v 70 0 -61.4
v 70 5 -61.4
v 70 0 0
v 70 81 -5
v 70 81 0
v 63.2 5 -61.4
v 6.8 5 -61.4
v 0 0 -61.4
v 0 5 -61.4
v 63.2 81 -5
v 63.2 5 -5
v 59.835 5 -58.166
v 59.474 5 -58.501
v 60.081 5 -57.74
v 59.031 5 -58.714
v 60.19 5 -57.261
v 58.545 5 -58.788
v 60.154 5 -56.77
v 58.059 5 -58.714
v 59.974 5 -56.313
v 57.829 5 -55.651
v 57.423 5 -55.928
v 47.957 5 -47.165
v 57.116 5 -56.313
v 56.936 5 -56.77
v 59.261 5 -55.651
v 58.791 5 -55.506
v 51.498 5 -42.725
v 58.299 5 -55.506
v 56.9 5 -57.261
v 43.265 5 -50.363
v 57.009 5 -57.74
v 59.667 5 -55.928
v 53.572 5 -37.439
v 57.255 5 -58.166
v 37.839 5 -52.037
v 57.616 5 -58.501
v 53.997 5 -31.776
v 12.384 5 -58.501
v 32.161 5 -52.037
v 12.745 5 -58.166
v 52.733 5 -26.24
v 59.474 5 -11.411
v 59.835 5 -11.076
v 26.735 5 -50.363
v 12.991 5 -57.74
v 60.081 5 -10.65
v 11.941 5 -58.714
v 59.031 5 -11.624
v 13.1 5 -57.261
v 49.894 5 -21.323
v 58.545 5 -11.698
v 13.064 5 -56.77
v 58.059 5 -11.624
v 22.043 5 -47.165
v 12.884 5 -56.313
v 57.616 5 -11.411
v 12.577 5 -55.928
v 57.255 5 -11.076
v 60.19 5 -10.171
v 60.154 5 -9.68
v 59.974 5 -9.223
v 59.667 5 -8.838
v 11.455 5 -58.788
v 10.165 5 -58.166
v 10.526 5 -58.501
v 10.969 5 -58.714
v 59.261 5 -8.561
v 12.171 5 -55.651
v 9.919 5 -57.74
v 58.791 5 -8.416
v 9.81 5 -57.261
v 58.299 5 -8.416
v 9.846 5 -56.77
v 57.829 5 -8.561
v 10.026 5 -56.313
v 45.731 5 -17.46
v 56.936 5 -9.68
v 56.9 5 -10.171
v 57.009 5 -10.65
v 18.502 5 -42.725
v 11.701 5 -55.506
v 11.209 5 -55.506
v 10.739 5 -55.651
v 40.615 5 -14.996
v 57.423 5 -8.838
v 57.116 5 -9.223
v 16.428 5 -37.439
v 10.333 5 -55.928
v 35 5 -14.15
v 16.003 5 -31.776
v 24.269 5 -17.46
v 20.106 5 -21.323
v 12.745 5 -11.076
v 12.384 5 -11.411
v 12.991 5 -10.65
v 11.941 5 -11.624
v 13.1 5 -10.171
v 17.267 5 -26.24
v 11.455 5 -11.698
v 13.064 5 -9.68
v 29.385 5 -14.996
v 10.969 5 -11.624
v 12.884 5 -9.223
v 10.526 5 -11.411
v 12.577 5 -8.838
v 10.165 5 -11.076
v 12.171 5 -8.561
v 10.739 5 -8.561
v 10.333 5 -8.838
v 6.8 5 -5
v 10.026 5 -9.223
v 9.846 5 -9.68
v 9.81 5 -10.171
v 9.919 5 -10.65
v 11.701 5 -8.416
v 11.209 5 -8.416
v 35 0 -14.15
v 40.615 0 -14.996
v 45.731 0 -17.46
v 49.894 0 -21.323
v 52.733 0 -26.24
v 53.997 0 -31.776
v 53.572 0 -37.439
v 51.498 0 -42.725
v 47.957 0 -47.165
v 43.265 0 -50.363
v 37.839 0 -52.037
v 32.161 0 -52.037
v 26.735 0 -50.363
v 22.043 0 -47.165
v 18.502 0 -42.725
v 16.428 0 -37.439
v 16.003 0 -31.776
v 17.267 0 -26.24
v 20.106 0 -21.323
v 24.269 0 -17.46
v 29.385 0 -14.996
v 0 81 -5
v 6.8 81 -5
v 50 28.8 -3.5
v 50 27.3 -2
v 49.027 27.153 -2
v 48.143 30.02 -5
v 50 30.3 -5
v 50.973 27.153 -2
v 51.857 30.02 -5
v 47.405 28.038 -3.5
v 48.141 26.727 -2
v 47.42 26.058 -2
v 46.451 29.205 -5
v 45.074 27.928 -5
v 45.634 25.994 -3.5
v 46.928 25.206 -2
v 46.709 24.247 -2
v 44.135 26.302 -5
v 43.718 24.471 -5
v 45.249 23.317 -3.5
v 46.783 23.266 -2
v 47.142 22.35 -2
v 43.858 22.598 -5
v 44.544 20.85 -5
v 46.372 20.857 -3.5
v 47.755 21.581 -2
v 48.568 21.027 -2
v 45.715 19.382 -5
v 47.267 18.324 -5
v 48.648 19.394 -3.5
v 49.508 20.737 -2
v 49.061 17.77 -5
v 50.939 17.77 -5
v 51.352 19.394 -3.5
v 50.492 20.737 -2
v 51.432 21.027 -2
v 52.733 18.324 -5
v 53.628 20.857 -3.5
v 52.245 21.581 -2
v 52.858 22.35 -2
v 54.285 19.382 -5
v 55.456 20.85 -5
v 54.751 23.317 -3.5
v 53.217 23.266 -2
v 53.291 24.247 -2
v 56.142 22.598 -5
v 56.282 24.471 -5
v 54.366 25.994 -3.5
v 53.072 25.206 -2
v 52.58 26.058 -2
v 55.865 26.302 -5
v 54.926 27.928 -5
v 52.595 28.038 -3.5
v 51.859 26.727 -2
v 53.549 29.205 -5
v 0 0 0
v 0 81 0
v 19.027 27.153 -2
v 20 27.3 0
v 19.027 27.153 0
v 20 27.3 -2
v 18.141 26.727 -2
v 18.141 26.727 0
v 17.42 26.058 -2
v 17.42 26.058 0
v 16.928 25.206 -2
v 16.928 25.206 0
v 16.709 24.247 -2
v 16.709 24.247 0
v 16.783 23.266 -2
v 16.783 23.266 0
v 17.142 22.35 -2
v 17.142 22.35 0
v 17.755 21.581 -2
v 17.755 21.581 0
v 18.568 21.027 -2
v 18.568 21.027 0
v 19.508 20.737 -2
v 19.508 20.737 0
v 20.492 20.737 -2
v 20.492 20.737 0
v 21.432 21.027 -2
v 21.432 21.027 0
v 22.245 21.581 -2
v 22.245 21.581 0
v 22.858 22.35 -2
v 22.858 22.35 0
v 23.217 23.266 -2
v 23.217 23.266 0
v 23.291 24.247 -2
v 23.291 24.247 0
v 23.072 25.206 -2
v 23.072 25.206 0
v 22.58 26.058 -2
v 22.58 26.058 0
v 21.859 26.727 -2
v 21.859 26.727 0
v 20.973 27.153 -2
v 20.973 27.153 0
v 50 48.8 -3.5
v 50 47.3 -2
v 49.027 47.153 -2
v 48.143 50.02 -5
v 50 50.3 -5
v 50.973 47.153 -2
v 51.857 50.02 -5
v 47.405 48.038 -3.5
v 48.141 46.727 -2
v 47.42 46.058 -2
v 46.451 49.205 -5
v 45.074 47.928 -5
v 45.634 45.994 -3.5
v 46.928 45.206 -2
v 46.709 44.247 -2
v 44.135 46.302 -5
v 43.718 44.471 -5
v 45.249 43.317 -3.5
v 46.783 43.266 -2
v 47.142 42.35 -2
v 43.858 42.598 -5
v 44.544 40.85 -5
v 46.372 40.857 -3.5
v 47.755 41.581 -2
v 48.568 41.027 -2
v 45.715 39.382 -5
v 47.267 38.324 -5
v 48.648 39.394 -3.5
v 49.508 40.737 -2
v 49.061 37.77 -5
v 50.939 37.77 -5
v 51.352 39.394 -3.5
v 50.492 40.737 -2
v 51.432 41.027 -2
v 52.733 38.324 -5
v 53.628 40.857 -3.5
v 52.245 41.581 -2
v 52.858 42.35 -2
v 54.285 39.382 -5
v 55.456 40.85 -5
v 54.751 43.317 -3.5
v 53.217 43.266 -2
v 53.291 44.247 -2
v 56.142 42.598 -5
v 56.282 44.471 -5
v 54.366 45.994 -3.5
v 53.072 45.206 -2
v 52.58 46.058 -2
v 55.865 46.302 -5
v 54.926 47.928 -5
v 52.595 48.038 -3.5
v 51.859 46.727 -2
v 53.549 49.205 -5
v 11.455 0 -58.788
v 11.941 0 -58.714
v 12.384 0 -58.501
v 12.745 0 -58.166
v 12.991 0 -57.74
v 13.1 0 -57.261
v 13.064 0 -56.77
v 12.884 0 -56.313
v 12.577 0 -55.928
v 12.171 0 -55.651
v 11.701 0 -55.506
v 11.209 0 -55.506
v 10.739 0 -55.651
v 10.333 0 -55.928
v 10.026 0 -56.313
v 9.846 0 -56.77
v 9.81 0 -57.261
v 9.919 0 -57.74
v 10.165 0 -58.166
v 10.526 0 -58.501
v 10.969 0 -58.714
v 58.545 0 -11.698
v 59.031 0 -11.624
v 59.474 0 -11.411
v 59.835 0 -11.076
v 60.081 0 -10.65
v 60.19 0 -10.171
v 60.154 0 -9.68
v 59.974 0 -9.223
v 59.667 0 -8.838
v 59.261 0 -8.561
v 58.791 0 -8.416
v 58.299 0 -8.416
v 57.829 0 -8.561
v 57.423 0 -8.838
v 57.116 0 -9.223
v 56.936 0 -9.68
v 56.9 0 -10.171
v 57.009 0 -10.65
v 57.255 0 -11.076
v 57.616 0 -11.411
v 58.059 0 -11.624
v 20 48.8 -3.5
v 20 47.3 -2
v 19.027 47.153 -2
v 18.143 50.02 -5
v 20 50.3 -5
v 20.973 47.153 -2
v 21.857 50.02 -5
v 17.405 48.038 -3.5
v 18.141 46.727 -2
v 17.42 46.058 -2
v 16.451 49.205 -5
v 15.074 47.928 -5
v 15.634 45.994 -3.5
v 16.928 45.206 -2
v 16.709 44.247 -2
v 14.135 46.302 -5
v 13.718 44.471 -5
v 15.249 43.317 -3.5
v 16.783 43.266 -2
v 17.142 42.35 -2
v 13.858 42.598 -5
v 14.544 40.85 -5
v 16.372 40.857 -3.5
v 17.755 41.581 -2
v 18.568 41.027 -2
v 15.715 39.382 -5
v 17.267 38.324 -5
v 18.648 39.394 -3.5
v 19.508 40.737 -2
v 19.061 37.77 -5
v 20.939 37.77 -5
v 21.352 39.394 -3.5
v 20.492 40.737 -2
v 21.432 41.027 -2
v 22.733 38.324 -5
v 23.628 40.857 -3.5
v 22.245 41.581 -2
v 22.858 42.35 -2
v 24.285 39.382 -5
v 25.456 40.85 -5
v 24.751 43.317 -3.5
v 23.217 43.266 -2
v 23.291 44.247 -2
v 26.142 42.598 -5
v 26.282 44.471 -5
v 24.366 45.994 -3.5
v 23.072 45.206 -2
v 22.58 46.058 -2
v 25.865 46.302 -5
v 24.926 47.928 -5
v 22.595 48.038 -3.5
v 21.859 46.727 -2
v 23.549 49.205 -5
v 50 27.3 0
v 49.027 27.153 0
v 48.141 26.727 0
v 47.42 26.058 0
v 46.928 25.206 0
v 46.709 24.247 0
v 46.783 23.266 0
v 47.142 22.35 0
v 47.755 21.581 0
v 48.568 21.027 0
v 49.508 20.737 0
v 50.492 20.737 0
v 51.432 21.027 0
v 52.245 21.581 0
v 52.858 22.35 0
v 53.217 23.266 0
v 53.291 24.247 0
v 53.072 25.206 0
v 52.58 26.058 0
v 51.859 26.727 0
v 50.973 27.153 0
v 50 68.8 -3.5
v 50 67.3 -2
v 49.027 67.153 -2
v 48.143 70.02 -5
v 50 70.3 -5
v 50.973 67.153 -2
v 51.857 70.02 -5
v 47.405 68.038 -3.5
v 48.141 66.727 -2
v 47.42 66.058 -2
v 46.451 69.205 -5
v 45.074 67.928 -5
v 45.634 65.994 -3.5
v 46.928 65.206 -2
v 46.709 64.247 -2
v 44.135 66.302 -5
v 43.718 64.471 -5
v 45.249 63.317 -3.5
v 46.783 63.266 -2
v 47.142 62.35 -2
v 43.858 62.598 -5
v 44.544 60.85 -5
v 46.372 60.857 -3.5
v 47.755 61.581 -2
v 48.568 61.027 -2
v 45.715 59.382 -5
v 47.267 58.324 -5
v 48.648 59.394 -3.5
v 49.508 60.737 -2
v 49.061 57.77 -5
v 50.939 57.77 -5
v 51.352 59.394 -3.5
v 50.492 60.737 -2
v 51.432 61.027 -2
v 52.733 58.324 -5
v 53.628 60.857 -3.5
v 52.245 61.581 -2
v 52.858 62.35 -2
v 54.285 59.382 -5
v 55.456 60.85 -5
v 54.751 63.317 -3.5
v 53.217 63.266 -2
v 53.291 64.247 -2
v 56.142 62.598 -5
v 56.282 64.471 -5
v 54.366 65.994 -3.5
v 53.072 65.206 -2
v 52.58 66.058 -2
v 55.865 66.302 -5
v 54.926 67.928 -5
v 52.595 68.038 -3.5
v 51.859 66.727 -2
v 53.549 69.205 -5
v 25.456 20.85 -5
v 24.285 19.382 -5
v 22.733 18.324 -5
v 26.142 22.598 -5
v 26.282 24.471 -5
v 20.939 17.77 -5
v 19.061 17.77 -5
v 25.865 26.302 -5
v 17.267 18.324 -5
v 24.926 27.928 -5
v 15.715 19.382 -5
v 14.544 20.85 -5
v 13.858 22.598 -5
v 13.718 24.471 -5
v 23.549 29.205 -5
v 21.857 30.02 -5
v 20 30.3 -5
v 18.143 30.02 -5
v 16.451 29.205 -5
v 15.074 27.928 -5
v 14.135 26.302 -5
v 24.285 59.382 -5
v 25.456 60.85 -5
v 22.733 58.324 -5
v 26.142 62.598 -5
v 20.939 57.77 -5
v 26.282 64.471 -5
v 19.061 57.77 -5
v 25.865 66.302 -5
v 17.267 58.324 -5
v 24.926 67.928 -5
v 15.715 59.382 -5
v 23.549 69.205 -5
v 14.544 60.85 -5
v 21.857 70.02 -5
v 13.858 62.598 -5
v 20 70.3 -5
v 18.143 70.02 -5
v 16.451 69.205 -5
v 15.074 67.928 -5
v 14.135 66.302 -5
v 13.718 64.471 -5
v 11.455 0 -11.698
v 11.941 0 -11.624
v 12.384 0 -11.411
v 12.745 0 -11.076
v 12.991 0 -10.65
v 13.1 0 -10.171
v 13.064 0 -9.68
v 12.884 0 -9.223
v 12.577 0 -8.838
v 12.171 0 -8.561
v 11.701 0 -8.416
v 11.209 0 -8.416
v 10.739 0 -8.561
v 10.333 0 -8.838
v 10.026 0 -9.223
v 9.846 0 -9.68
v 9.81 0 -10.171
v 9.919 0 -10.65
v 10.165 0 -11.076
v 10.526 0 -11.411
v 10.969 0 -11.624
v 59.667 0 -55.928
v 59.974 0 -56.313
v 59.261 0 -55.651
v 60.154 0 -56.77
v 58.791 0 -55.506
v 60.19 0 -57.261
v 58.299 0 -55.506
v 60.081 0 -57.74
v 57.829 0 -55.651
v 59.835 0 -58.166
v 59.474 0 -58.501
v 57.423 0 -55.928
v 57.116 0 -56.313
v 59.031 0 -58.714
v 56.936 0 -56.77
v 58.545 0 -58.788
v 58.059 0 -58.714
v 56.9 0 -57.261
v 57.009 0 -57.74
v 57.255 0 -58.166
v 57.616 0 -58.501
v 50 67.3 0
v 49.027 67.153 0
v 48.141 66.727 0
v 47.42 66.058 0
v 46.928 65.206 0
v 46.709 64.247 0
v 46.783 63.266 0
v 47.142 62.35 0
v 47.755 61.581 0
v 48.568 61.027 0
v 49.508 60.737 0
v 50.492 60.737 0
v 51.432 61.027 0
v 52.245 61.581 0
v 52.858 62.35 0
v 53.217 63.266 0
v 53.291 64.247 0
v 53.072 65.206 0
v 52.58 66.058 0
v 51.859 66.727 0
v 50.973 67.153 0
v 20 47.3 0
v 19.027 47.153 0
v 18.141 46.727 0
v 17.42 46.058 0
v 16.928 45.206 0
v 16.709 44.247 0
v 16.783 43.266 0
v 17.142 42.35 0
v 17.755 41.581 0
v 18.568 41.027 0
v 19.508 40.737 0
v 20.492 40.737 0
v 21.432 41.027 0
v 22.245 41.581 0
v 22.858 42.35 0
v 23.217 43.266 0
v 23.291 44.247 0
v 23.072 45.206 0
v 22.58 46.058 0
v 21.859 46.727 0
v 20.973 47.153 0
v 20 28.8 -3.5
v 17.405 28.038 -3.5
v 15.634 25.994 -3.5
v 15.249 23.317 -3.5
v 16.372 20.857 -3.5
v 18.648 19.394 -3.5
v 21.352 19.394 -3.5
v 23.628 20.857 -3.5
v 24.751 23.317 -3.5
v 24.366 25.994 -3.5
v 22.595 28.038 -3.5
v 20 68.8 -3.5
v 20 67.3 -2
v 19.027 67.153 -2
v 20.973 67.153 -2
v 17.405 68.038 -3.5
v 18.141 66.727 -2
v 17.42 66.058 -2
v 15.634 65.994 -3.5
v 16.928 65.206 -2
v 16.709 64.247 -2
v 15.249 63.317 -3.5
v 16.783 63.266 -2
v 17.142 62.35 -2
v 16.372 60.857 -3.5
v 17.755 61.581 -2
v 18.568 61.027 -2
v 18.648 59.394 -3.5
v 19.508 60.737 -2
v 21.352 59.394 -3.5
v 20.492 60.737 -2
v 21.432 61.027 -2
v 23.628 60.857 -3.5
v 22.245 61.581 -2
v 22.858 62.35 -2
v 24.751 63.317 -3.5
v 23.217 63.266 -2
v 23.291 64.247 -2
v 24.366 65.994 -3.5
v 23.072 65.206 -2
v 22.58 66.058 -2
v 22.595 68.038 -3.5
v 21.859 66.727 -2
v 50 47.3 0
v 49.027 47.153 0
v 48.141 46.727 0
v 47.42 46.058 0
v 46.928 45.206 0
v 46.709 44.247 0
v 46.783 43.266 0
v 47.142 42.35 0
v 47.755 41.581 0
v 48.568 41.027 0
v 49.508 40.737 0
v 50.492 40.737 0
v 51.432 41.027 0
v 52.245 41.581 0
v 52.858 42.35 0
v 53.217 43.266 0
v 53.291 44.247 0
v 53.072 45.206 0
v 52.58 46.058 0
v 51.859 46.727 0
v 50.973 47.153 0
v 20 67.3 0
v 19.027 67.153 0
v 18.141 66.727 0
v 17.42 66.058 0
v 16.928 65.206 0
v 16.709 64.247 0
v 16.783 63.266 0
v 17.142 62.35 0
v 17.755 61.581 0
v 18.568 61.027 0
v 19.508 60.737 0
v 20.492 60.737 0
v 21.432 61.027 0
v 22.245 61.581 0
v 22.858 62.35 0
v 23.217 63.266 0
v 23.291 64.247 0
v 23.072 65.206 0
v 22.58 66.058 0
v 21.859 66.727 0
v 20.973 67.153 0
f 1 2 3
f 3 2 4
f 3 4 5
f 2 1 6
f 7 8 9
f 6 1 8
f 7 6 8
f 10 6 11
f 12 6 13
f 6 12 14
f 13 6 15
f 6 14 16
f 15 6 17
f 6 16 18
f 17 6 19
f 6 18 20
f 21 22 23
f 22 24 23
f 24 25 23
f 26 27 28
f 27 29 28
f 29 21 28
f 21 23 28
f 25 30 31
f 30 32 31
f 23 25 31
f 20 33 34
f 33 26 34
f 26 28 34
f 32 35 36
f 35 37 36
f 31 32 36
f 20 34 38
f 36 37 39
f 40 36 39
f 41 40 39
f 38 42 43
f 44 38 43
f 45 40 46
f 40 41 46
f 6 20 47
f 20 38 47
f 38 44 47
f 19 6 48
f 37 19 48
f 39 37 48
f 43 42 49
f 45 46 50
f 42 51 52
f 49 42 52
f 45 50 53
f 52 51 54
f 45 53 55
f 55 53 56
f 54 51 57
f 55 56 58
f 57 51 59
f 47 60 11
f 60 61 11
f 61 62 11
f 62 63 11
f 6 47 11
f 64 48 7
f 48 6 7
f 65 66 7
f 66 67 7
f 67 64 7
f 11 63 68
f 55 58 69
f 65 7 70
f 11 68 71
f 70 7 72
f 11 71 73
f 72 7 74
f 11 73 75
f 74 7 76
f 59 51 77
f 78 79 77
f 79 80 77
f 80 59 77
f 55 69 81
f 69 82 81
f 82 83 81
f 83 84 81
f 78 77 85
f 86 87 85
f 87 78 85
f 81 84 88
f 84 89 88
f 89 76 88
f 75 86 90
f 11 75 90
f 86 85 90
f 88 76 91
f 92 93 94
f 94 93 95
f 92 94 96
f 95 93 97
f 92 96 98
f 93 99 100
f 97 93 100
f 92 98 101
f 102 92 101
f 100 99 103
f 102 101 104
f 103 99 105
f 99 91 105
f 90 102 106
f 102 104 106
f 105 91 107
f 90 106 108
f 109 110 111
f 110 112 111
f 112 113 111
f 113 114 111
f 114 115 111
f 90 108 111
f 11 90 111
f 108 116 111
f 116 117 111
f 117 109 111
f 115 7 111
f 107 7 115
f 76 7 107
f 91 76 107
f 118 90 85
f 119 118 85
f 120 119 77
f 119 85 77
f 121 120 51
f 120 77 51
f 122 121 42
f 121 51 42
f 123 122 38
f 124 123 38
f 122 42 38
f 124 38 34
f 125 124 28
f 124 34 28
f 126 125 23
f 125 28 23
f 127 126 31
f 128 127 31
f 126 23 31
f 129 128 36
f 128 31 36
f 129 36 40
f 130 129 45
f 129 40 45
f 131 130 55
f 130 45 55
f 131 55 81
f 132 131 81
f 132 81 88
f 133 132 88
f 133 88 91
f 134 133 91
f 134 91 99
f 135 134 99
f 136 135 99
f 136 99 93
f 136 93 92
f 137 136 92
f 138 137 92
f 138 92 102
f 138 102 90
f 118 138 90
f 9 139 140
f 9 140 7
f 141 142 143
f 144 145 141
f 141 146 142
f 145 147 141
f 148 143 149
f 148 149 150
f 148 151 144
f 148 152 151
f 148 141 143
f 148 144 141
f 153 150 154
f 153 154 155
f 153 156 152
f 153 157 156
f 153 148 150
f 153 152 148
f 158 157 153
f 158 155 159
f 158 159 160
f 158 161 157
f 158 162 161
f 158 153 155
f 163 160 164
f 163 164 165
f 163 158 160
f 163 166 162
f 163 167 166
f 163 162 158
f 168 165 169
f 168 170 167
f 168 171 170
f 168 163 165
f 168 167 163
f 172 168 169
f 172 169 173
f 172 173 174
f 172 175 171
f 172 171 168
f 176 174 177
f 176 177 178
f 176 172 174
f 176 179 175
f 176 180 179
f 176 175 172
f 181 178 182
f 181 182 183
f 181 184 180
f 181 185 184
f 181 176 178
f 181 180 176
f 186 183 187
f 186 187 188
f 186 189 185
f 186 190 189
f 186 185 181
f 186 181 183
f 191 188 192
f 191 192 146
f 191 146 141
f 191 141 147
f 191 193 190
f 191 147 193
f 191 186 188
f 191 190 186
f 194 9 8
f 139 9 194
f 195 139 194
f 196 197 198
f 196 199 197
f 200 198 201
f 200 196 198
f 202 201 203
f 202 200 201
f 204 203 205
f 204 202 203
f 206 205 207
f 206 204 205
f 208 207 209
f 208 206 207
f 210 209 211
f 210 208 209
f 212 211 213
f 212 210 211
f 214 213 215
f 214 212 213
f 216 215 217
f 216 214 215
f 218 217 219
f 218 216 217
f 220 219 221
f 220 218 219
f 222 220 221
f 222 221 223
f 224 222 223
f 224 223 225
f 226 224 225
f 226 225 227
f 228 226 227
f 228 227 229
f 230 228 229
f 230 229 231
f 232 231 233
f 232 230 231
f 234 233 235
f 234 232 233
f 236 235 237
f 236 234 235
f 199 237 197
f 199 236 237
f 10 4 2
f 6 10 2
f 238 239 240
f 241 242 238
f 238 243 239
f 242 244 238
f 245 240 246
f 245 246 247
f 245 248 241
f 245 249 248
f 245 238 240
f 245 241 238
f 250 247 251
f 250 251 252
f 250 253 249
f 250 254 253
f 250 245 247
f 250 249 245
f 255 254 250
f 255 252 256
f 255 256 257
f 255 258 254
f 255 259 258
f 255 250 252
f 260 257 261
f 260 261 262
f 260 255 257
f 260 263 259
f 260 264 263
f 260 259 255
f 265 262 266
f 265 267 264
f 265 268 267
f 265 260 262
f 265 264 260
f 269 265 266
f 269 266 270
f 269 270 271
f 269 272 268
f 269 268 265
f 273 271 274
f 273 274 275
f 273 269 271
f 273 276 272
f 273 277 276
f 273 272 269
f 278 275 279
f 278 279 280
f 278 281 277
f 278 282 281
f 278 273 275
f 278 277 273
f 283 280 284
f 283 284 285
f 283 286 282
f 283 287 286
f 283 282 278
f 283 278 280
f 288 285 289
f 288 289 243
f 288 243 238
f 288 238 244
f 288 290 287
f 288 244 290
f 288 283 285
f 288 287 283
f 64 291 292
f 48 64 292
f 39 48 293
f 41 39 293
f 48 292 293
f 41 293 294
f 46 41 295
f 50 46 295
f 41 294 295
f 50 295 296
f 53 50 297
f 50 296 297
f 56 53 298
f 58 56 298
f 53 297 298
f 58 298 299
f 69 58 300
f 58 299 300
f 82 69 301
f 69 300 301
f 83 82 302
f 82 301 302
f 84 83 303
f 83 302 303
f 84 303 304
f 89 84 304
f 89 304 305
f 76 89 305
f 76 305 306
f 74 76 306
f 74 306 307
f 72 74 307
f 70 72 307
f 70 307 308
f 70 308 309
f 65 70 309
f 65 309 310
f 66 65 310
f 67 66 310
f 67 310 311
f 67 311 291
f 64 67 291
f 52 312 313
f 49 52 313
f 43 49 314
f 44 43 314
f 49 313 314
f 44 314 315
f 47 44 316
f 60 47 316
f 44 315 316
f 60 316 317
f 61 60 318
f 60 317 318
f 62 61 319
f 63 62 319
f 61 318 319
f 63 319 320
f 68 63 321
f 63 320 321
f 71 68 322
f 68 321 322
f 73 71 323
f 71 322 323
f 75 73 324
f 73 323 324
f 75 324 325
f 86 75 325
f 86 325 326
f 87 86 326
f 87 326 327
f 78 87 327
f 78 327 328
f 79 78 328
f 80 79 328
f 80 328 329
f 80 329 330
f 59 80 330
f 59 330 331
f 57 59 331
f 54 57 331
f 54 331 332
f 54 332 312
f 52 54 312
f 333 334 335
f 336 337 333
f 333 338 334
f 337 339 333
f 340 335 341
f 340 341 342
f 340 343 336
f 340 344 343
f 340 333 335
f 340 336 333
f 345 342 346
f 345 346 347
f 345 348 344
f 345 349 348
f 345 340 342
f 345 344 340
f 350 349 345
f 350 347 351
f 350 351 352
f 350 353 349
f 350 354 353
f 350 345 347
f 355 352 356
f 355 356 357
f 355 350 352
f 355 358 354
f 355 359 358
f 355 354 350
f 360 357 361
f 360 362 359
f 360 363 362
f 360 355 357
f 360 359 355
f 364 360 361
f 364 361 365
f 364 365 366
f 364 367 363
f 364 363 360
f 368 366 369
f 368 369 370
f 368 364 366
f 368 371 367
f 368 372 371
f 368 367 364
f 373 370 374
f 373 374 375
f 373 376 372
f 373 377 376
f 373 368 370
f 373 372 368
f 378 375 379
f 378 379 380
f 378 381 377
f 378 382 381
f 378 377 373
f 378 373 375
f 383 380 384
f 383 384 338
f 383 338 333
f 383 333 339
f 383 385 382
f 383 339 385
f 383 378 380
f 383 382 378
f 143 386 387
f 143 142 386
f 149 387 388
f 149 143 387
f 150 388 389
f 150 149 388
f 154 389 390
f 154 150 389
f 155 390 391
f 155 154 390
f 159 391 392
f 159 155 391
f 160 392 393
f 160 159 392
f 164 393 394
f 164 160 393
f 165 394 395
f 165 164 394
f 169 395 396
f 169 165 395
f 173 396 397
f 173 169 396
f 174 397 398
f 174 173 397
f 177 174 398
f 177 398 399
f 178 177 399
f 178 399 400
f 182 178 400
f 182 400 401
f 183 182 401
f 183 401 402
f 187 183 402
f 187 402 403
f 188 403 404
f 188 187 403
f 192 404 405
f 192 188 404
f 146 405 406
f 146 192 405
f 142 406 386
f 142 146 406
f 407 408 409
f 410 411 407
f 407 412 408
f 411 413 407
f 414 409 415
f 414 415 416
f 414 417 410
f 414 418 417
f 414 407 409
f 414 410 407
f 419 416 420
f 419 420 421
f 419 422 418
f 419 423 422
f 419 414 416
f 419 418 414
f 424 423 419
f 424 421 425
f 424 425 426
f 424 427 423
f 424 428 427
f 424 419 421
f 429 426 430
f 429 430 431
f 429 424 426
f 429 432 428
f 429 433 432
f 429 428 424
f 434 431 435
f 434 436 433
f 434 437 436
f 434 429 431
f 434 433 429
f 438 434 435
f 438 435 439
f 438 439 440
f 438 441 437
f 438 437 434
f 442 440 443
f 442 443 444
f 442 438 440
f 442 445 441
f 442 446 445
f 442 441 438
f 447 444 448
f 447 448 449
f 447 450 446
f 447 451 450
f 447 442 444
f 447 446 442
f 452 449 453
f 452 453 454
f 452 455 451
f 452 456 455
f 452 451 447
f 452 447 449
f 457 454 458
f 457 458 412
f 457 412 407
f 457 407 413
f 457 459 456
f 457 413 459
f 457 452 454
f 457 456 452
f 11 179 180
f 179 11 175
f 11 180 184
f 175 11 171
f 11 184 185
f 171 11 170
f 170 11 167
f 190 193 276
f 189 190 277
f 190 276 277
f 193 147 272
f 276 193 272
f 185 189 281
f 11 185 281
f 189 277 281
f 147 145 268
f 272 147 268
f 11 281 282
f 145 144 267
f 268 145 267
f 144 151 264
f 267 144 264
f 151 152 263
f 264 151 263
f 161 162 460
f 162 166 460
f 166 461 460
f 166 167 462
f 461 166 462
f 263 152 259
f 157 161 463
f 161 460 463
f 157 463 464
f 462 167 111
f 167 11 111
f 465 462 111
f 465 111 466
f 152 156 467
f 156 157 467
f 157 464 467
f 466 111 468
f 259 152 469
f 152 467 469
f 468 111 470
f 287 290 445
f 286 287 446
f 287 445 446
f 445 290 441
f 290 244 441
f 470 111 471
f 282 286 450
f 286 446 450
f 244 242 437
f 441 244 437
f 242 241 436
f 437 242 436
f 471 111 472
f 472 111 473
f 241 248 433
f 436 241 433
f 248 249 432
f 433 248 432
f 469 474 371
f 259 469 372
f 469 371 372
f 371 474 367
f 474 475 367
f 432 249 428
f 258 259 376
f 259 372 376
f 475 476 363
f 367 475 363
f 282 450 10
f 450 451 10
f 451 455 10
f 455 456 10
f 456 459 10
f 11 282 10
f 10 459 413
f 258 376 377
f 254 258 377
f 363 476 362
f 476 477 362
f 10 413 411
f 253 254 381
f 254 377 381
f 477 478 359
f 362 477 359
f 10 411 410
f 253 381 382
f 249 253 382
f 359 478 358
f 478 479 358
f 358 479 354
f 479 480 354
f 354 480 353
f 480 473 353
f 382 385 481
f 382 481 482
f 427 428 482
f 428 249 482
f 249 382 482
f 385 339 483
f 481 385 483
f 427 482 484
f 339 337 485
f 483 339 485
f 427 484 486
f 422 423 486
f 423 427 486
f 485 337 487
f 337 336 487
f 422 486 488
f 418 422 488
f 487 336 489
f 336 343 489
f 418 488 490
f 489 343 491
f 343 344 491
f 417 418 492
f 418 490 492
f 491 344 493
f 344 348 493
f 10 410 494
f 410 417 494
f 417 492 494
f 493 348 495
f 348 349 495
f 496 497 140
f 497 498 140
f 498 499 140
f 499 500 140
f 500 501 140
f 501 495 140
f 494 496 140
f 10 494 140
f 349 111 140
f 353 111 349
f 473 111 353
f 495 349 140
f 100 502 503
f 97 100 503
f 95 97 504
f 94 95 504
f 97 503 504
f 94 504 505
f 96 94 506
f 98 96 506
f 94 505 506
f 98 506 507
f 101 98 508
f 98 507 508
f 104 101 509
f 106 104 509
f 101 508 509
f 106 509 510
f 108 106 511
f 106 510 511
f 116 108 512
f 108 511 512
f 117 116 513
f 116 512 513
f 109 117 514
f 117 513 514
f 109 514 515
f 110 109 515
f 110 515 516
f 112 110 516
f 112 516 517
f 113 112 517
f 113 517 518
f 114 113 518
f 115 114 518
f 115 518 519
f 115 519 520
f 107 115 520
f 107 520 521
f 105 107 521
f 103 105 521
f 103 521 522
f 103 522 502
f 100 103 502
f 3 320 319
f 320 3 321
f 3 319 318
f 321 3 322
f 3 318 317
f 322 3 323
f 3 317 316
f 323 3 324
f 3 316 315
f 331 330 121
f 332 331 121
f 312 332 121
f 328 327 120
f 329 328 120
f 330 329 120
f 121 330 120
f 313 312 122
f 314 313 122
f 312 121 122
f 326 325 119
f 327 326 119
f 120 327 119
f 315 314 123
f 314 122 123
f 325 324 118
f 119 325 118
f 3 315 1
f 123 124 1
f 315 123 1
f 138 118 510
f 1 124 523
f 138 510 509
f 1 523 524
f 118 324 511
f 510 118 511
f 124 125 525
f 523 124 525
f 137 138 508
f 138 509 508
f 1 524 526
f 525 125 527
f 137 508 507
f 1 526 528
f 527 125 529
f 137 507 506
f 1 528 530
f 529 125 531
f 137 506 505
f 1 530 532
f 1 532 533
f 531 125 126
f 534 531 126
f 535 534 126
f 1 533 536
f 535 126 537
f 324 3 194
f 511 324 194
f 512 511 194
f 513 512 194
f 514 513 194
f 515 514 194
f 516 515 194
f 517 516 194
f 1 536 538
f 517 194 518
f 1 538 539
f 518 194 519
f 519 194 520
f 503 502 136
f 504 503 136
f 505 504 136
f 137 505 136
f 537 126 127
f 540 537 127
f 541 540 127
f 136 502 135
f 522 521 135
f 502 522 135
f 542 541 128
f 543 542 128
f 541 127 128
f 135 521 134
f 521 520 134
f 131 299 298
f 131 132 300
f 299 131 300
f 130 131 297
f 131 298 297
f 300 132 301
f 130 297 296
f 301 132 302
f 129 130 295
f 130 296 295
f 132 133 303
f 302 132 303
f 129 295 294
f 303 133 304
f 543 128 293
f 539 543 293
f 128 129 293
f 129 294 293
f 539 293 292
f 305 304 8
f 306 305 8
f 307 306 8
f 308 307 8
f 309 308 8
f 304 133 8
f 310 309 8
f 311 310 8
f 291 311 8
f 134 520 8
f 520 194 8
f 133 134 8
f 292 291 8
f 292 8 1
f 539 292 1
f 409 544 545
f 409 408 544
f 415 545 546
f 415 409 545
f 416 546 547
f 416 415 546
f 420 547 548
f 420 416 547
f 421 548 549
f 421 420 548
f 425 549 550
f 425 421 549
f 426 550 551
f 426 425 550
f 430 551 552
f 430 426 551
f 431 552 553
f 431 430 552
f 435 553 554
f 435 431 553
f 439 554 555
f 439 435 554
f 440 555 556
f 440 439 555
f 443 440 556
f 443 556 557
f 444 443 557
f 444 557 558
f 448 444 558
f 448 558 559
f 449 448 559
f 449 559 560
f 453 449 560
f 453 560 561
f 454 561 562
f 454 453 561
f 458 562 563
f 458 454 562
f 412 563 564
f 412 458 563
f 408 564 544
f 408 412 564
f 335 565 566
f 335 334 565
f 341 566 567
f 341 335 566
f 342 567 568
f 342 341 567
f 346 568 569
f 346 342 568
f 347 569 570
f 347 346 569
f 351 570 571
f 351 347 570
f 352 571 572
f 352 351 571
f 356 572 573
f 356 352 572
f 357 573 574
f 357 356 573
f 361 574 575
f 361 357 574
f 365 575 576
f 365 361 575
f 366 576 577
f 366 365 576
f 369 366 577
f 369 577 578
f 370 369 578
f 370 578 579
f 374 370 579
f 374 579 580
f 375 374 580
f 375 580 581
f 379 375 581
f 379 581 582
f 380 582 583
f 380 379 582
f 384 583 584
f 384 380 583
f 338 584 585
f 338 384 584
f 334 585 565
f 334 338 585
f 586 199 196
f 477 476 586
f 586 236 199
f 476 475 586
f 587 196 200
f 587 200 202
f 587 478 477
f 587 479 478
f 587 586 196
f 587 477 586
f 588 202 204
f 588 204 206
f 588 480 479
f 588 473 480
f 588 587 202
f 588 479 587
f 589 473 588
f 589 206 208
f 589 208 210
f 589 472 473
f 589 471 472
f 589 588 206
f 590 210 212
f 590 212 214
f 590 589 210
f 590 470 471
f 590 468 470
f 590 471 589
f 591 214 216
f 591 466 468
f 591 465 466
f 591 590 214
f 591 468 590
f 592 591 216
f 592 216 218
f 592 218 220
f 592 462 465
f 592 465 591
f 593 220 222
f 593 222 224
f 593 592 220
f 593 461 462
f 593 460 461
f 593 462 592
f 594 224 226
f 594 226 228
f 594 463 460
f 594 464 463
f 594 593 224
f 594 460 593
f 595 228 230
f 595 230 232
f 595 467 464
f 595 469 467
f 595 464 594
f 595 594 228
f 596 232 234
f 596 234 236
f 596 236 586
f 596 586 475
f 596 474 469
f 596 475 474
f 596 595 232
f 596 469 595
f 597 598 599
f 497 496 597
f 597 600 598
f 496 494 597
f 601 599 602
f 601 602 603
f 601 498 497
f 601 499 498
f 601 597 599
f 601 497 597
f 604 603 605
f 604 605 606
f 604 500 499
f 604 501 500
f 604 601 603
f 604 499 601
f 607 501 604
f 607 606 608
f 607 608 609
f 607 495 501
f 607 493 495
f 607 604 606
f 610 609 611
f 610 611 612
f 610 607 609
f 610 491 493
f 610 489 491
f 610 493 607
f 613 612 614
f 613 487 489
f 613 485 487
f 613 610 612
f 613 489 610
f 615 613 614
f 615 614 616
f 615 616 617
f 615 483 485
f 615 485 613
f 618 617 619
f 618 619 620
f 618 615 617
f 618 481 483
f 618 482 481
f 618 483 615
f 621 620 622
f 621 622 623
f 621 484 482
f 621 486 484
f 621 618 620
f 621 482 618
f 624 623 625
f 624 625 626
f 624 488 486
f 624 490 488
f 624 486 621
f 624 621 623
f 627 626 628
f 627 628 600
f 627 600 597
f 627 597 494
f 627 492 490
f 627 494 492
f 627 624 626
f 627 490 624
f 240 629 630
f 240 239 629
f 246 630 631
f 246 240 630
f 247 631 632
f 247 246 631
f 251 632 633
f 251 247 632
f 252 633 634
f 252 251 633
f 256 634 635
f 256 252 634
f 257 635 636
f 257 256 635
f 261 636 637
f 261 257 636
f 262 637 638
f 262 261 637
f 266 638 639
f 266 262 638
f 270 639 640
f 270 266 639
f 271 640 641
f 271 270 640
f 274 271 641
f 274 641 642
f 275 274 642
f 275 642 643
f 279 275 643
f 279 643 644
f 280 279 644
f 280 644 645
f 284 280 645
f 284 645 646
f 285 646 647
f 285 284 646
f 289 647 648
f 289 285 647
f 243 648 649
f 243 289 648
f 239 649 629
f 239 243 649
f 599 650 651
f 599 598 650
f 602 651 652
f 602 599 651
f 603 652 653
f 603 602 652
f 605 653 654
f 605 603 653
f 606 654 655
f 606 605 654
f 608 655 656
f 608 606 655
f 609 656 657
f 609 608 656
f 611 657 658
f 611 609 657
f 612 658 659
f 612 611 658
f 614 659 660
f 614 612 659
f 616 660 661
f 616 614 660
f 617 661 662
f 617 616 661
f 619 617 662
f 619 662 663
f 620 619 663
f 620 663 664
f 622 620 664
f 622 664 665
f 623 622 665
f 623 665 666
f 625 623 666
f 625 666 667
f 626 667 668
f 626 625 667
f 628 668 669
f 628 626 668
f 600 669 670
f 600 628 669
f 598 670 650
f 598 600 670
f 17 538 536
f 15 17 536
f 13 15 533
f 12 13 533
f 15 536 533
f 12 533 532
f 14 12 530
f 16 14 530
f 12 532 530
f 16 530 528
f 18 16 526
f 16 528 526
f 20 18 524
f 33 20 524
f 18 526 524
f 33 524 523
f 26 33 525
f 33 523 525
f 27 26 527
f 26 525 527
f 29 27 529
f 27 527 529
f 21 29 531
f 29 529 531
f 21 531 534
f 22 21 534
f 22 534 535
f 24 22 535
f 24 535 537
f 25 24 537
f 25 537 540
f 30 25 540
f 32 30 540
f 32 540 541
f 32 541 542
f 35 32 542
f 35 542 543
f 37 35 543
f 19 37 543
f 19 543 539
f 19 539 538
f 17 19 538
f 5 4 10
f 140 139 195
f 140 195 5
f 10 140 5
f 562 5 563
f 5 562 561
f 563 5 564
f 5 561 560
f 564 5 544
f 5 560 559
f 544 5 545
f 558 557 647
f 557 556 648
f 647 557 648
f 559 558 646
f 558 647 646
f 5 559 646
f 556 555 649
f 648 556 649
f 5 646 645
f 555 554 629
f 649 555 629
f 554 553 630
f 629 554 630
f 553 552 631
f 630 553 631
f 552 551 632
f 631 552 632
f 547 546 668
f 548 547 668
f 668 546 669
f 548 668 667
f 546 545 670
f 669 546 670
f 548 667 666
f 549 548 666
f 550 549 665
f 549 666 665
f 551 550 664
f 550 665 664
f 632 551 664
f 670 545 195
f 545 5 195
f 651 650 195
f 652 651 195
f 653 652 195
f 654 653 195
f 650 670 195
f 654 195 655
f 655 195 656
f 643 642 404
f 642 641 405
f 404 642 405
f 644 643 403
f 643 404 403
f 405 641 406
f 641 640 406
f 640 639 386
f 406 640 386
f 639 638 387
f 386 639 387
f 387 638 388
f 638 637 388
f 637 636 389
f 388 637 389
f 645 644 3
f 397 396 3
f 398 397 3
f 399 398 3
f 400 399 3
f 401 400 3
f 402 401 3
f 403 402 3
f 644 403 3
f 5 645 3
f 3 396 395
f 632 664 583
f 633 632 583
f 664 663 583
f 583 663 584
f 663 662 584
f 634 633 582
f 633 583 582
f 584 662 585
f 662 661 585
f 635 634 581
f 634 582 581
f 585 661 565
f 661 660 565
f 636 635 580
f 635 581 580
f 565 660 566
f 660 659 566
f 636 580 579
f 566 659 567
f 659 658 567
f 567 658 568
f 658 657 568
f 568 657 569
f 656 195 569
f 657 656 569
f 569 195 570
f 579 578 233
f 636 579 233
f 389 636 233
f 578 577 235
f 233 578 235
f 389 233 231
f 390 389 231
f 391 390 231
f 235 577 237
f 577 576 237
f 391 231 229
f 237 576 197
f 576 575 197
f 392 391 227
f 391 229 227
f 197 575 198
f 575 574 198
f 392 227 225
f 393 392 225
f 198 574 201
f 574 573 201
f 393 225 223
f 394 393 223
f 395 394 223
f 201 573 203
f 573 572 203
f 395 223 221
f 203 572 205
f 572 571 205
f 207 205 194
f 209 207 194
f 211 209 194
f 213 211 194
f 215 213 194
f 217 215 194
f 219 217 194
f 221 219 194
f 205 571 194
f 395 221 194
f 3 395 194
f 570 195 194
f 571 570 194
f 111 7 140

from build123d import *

# Parameters (mm, degrees)
DODANIE_WYCI_GNI_CIE1_DEPTH              = 70
DODANIE_WYCI_GNI_CIE2_DEPTH              = 6.8
OTW_R_GWINTOWANY_M41_D                   = 3.3
SZKIC3_R                                 = 19.05
WYTNIJ_WYCI_GNI_CIE1_DEPTH               = 9.8
POG_BIENIE_STO_KOWE_POD_M6_RUB_Z_2_COUNT = 2
POG_BIENIE_STO_KOWE_POD_M6_RUB_Z_2_PITCH = 30
POG_BIENIE_STO_KOWE_POD_M6_RUB_Z_3_COUNT = 2
POG_BIENIE_STO_KOWE_POD_M6_RUB_Z_3_PITCH = 20
POG_BIENIE_STO_KOWE_POD_M6_RUB_Z_4_COUNT = 2
POG_BIENIE_STO_KOWE_POD_M6_RUB_Z_4_PITCH = 36.055512755
POG_BIENIE_STO_KOWE_POD_M6_RUB_Z_5_COUNT = 2
POG_BIENIE_STO_KOWE_POD_M6_RUB_Z_5_PITCH = 40
POG_BIENIE_STO_KOWE_POD_M6_RUB_Z_6_COUNT = 2
POG_BIENIE_STO_KOWE_POD_M6_RUB_Z_6_PITCH = 50


with BuildPart() as part:
    # Szkic1 → Dodanie-wyciągnięcie1 (new body)
    with BuildSketch(Plane(origin=(0, 0, 0), x_dir=(0, 0, -1), z_dir=(1, 0, 0))):
        Polygon((0, 0), (61.4, 0), (61.4, 5), (5, 5), (5, 81), (0, 81), align=None)
    extrude(amount=DODANIE_WYCI_GNI_CIE1_DEPTH)

    # Szkic2 → Dodanie-wyciągnięcie2 (add)
    with BuildSketch(Plane(origin=(70, 0, 0), x_dir=(0, 0, -1), z_dir=(1, 0, 0))):
        Polygon((5, 81), (61.4, 5), (5, 5), align=None)
    dodanie_wyci_gni_cie2 = extrude(amount=-DODANIE_WYCI_GNI_CIE2_DEPTH)

    # Lustro1: Dodanie-wyciągnięcie2 across plane
    add(dodanie_wyci_gni_cie2.mirror(Plane(origin=(35, 0, 0), x_dir=(0, 0, 1), z_dir=(1, 0, 0))))

    # Otwór gwintowany M41 (through all)
    with Locations(Plane(origin=(11.455, 5, -57.137511403), x_dir=(0, 0, 1), z_dir=(0, 1, 0))):
        with Locations((0, 0), (0, 47.09), (47.09, 0), (47.09, 47.09)):
            Hole(OTW_R_GWINTOWANY_M41_D / 2)

    # Szkic3 → Wytnij-wyciągnięcie1 (cut)
    with BuildSketch(Plane(origin=(0, 5, 0), x_dir=(1, 0, 0), z_dir=(0, 1, 0))):
        with Locations(Location((35, 33.2, 0), (0, 0, 270))):
            Circle(SZKIC3_R)
    extrude(amount=-WYTNIJ_WYCI_GNI_CIE1_DEPTH, mode=Mode.SUBTRACT)

    # Szkic7 → Pogłębienie stożkowe pod M6 Śrubę z łbem soczewkowym1 (revolve, cut)
    with BuildSketch(Plane(origin=(50, 64, -5), x_dir=(0, 1, 0), z_dir=(1, 0, 0))):
        Polygon((0, 0), (0, 5), (3.3, 5), (3.3, 3), (6.3, 0), align=None)
    pog_bienie_sto_kowe_pod_m6_rub_z_bem = revolve(axis=Axis((50, 64, -11.35), (0, 0, 1)), mode=Mode.SUBTRACT)

    # Pog_bienie sto_kowe pod M6 _rub_ z _ 2: Pogłębienie stożkowe pod M6 Śrubę z łbem soczewkowym1 ×2
    with Locations(*[(-i * POG_BIENIE_STO_KOWE_POD_M6_RUB_Z_2_PITCH, 0, 0) for i in range(1, POG_BIENIE_STO_KOWE_POD_M6_RUB_Z_2_COUNT)]):
        add(pog_bienie_sto_kowe_pod_m6_rub_z_bem, mode=Mode.SUBTRACT)

    # Pog_bienie sto_kowe pod M6 _rub_ z _ 3: Pogłębienie stożkowe pod M6 Śrubę z łbem soczewkowym1 ×2
    with Locations(*[(0, -i * POG_BIENIE_STO_KOWE_POD_M6_RUB_Z_3_PITCH, 0) for i in range(1, POG_BIENIE_STO_KOWE_POD_M6_RUB_Z_3_COUNT)]):
        add(pog_bienie_sto_kowe_pod_m6_rub_z_bem, mode=Mode.SUBTRACT)

    # Pog_bienie sto_kowe pod M6 _rub_ z _ 4: Pogłębienie stożkowe pod M6 Śrubę z łbem soczewkowym1 ×2
    with Locations(*[Vector(-0.8320502943378438, -0.5547001962252289, 0) * (i * POG_BIENIE_STO_KOWE_POD_M6_RUB_Z_4_PITCH) for i in range(1, POG_BIENIE_STO_KOWE_POD_M6_RUB_Z_4_COUNT)]):
        add(pog_bienie_sto_kowe_pod_m6_rub_z_bem, mode=Mode.SUBTRACT)

    # Pog_bienie sto_kowe pod M6 _rub_ z _ 5: Pogłębienie stożkowe pod M6 Śrubę z łbem soczewkowym1 ×2
    with Locations(*[(0, -i * POG_BIENIE_STO_KOWE_POD_M6_RUB_Z_5_PITCH, 0) for i in range(1, POG_BIENIE_STO_KOWE_POD_M6_RUB_Z_5_COUNT)]):
        add(pog_bienie_sto_kowe_pod_m6_rub_z_bem, mode=Mode.SUBTRACT)

    # Pog_bienie sto_kowe pod M6 _rub_ z _ 6: Pogłębienie stożkowe pod M6 Śrubę z łbem soczewkowym1 ×2
    with Locations(*[Vector(-0.6000000000000001, -0.7999999999999999, 0) * (i * POG_BIENIE_STO_KOWE_POD_M6_RUB_Z_6_PITCH) for i in range(1, POG_BIENIE_STO_KOWE_POD_M6_RUB_Z_6_COUNT)]):
        add(pog_bienie_sto_kowe_pod_m6_rub_z_bem, mode=Mode.SUBTRACT)


solid = part.part
